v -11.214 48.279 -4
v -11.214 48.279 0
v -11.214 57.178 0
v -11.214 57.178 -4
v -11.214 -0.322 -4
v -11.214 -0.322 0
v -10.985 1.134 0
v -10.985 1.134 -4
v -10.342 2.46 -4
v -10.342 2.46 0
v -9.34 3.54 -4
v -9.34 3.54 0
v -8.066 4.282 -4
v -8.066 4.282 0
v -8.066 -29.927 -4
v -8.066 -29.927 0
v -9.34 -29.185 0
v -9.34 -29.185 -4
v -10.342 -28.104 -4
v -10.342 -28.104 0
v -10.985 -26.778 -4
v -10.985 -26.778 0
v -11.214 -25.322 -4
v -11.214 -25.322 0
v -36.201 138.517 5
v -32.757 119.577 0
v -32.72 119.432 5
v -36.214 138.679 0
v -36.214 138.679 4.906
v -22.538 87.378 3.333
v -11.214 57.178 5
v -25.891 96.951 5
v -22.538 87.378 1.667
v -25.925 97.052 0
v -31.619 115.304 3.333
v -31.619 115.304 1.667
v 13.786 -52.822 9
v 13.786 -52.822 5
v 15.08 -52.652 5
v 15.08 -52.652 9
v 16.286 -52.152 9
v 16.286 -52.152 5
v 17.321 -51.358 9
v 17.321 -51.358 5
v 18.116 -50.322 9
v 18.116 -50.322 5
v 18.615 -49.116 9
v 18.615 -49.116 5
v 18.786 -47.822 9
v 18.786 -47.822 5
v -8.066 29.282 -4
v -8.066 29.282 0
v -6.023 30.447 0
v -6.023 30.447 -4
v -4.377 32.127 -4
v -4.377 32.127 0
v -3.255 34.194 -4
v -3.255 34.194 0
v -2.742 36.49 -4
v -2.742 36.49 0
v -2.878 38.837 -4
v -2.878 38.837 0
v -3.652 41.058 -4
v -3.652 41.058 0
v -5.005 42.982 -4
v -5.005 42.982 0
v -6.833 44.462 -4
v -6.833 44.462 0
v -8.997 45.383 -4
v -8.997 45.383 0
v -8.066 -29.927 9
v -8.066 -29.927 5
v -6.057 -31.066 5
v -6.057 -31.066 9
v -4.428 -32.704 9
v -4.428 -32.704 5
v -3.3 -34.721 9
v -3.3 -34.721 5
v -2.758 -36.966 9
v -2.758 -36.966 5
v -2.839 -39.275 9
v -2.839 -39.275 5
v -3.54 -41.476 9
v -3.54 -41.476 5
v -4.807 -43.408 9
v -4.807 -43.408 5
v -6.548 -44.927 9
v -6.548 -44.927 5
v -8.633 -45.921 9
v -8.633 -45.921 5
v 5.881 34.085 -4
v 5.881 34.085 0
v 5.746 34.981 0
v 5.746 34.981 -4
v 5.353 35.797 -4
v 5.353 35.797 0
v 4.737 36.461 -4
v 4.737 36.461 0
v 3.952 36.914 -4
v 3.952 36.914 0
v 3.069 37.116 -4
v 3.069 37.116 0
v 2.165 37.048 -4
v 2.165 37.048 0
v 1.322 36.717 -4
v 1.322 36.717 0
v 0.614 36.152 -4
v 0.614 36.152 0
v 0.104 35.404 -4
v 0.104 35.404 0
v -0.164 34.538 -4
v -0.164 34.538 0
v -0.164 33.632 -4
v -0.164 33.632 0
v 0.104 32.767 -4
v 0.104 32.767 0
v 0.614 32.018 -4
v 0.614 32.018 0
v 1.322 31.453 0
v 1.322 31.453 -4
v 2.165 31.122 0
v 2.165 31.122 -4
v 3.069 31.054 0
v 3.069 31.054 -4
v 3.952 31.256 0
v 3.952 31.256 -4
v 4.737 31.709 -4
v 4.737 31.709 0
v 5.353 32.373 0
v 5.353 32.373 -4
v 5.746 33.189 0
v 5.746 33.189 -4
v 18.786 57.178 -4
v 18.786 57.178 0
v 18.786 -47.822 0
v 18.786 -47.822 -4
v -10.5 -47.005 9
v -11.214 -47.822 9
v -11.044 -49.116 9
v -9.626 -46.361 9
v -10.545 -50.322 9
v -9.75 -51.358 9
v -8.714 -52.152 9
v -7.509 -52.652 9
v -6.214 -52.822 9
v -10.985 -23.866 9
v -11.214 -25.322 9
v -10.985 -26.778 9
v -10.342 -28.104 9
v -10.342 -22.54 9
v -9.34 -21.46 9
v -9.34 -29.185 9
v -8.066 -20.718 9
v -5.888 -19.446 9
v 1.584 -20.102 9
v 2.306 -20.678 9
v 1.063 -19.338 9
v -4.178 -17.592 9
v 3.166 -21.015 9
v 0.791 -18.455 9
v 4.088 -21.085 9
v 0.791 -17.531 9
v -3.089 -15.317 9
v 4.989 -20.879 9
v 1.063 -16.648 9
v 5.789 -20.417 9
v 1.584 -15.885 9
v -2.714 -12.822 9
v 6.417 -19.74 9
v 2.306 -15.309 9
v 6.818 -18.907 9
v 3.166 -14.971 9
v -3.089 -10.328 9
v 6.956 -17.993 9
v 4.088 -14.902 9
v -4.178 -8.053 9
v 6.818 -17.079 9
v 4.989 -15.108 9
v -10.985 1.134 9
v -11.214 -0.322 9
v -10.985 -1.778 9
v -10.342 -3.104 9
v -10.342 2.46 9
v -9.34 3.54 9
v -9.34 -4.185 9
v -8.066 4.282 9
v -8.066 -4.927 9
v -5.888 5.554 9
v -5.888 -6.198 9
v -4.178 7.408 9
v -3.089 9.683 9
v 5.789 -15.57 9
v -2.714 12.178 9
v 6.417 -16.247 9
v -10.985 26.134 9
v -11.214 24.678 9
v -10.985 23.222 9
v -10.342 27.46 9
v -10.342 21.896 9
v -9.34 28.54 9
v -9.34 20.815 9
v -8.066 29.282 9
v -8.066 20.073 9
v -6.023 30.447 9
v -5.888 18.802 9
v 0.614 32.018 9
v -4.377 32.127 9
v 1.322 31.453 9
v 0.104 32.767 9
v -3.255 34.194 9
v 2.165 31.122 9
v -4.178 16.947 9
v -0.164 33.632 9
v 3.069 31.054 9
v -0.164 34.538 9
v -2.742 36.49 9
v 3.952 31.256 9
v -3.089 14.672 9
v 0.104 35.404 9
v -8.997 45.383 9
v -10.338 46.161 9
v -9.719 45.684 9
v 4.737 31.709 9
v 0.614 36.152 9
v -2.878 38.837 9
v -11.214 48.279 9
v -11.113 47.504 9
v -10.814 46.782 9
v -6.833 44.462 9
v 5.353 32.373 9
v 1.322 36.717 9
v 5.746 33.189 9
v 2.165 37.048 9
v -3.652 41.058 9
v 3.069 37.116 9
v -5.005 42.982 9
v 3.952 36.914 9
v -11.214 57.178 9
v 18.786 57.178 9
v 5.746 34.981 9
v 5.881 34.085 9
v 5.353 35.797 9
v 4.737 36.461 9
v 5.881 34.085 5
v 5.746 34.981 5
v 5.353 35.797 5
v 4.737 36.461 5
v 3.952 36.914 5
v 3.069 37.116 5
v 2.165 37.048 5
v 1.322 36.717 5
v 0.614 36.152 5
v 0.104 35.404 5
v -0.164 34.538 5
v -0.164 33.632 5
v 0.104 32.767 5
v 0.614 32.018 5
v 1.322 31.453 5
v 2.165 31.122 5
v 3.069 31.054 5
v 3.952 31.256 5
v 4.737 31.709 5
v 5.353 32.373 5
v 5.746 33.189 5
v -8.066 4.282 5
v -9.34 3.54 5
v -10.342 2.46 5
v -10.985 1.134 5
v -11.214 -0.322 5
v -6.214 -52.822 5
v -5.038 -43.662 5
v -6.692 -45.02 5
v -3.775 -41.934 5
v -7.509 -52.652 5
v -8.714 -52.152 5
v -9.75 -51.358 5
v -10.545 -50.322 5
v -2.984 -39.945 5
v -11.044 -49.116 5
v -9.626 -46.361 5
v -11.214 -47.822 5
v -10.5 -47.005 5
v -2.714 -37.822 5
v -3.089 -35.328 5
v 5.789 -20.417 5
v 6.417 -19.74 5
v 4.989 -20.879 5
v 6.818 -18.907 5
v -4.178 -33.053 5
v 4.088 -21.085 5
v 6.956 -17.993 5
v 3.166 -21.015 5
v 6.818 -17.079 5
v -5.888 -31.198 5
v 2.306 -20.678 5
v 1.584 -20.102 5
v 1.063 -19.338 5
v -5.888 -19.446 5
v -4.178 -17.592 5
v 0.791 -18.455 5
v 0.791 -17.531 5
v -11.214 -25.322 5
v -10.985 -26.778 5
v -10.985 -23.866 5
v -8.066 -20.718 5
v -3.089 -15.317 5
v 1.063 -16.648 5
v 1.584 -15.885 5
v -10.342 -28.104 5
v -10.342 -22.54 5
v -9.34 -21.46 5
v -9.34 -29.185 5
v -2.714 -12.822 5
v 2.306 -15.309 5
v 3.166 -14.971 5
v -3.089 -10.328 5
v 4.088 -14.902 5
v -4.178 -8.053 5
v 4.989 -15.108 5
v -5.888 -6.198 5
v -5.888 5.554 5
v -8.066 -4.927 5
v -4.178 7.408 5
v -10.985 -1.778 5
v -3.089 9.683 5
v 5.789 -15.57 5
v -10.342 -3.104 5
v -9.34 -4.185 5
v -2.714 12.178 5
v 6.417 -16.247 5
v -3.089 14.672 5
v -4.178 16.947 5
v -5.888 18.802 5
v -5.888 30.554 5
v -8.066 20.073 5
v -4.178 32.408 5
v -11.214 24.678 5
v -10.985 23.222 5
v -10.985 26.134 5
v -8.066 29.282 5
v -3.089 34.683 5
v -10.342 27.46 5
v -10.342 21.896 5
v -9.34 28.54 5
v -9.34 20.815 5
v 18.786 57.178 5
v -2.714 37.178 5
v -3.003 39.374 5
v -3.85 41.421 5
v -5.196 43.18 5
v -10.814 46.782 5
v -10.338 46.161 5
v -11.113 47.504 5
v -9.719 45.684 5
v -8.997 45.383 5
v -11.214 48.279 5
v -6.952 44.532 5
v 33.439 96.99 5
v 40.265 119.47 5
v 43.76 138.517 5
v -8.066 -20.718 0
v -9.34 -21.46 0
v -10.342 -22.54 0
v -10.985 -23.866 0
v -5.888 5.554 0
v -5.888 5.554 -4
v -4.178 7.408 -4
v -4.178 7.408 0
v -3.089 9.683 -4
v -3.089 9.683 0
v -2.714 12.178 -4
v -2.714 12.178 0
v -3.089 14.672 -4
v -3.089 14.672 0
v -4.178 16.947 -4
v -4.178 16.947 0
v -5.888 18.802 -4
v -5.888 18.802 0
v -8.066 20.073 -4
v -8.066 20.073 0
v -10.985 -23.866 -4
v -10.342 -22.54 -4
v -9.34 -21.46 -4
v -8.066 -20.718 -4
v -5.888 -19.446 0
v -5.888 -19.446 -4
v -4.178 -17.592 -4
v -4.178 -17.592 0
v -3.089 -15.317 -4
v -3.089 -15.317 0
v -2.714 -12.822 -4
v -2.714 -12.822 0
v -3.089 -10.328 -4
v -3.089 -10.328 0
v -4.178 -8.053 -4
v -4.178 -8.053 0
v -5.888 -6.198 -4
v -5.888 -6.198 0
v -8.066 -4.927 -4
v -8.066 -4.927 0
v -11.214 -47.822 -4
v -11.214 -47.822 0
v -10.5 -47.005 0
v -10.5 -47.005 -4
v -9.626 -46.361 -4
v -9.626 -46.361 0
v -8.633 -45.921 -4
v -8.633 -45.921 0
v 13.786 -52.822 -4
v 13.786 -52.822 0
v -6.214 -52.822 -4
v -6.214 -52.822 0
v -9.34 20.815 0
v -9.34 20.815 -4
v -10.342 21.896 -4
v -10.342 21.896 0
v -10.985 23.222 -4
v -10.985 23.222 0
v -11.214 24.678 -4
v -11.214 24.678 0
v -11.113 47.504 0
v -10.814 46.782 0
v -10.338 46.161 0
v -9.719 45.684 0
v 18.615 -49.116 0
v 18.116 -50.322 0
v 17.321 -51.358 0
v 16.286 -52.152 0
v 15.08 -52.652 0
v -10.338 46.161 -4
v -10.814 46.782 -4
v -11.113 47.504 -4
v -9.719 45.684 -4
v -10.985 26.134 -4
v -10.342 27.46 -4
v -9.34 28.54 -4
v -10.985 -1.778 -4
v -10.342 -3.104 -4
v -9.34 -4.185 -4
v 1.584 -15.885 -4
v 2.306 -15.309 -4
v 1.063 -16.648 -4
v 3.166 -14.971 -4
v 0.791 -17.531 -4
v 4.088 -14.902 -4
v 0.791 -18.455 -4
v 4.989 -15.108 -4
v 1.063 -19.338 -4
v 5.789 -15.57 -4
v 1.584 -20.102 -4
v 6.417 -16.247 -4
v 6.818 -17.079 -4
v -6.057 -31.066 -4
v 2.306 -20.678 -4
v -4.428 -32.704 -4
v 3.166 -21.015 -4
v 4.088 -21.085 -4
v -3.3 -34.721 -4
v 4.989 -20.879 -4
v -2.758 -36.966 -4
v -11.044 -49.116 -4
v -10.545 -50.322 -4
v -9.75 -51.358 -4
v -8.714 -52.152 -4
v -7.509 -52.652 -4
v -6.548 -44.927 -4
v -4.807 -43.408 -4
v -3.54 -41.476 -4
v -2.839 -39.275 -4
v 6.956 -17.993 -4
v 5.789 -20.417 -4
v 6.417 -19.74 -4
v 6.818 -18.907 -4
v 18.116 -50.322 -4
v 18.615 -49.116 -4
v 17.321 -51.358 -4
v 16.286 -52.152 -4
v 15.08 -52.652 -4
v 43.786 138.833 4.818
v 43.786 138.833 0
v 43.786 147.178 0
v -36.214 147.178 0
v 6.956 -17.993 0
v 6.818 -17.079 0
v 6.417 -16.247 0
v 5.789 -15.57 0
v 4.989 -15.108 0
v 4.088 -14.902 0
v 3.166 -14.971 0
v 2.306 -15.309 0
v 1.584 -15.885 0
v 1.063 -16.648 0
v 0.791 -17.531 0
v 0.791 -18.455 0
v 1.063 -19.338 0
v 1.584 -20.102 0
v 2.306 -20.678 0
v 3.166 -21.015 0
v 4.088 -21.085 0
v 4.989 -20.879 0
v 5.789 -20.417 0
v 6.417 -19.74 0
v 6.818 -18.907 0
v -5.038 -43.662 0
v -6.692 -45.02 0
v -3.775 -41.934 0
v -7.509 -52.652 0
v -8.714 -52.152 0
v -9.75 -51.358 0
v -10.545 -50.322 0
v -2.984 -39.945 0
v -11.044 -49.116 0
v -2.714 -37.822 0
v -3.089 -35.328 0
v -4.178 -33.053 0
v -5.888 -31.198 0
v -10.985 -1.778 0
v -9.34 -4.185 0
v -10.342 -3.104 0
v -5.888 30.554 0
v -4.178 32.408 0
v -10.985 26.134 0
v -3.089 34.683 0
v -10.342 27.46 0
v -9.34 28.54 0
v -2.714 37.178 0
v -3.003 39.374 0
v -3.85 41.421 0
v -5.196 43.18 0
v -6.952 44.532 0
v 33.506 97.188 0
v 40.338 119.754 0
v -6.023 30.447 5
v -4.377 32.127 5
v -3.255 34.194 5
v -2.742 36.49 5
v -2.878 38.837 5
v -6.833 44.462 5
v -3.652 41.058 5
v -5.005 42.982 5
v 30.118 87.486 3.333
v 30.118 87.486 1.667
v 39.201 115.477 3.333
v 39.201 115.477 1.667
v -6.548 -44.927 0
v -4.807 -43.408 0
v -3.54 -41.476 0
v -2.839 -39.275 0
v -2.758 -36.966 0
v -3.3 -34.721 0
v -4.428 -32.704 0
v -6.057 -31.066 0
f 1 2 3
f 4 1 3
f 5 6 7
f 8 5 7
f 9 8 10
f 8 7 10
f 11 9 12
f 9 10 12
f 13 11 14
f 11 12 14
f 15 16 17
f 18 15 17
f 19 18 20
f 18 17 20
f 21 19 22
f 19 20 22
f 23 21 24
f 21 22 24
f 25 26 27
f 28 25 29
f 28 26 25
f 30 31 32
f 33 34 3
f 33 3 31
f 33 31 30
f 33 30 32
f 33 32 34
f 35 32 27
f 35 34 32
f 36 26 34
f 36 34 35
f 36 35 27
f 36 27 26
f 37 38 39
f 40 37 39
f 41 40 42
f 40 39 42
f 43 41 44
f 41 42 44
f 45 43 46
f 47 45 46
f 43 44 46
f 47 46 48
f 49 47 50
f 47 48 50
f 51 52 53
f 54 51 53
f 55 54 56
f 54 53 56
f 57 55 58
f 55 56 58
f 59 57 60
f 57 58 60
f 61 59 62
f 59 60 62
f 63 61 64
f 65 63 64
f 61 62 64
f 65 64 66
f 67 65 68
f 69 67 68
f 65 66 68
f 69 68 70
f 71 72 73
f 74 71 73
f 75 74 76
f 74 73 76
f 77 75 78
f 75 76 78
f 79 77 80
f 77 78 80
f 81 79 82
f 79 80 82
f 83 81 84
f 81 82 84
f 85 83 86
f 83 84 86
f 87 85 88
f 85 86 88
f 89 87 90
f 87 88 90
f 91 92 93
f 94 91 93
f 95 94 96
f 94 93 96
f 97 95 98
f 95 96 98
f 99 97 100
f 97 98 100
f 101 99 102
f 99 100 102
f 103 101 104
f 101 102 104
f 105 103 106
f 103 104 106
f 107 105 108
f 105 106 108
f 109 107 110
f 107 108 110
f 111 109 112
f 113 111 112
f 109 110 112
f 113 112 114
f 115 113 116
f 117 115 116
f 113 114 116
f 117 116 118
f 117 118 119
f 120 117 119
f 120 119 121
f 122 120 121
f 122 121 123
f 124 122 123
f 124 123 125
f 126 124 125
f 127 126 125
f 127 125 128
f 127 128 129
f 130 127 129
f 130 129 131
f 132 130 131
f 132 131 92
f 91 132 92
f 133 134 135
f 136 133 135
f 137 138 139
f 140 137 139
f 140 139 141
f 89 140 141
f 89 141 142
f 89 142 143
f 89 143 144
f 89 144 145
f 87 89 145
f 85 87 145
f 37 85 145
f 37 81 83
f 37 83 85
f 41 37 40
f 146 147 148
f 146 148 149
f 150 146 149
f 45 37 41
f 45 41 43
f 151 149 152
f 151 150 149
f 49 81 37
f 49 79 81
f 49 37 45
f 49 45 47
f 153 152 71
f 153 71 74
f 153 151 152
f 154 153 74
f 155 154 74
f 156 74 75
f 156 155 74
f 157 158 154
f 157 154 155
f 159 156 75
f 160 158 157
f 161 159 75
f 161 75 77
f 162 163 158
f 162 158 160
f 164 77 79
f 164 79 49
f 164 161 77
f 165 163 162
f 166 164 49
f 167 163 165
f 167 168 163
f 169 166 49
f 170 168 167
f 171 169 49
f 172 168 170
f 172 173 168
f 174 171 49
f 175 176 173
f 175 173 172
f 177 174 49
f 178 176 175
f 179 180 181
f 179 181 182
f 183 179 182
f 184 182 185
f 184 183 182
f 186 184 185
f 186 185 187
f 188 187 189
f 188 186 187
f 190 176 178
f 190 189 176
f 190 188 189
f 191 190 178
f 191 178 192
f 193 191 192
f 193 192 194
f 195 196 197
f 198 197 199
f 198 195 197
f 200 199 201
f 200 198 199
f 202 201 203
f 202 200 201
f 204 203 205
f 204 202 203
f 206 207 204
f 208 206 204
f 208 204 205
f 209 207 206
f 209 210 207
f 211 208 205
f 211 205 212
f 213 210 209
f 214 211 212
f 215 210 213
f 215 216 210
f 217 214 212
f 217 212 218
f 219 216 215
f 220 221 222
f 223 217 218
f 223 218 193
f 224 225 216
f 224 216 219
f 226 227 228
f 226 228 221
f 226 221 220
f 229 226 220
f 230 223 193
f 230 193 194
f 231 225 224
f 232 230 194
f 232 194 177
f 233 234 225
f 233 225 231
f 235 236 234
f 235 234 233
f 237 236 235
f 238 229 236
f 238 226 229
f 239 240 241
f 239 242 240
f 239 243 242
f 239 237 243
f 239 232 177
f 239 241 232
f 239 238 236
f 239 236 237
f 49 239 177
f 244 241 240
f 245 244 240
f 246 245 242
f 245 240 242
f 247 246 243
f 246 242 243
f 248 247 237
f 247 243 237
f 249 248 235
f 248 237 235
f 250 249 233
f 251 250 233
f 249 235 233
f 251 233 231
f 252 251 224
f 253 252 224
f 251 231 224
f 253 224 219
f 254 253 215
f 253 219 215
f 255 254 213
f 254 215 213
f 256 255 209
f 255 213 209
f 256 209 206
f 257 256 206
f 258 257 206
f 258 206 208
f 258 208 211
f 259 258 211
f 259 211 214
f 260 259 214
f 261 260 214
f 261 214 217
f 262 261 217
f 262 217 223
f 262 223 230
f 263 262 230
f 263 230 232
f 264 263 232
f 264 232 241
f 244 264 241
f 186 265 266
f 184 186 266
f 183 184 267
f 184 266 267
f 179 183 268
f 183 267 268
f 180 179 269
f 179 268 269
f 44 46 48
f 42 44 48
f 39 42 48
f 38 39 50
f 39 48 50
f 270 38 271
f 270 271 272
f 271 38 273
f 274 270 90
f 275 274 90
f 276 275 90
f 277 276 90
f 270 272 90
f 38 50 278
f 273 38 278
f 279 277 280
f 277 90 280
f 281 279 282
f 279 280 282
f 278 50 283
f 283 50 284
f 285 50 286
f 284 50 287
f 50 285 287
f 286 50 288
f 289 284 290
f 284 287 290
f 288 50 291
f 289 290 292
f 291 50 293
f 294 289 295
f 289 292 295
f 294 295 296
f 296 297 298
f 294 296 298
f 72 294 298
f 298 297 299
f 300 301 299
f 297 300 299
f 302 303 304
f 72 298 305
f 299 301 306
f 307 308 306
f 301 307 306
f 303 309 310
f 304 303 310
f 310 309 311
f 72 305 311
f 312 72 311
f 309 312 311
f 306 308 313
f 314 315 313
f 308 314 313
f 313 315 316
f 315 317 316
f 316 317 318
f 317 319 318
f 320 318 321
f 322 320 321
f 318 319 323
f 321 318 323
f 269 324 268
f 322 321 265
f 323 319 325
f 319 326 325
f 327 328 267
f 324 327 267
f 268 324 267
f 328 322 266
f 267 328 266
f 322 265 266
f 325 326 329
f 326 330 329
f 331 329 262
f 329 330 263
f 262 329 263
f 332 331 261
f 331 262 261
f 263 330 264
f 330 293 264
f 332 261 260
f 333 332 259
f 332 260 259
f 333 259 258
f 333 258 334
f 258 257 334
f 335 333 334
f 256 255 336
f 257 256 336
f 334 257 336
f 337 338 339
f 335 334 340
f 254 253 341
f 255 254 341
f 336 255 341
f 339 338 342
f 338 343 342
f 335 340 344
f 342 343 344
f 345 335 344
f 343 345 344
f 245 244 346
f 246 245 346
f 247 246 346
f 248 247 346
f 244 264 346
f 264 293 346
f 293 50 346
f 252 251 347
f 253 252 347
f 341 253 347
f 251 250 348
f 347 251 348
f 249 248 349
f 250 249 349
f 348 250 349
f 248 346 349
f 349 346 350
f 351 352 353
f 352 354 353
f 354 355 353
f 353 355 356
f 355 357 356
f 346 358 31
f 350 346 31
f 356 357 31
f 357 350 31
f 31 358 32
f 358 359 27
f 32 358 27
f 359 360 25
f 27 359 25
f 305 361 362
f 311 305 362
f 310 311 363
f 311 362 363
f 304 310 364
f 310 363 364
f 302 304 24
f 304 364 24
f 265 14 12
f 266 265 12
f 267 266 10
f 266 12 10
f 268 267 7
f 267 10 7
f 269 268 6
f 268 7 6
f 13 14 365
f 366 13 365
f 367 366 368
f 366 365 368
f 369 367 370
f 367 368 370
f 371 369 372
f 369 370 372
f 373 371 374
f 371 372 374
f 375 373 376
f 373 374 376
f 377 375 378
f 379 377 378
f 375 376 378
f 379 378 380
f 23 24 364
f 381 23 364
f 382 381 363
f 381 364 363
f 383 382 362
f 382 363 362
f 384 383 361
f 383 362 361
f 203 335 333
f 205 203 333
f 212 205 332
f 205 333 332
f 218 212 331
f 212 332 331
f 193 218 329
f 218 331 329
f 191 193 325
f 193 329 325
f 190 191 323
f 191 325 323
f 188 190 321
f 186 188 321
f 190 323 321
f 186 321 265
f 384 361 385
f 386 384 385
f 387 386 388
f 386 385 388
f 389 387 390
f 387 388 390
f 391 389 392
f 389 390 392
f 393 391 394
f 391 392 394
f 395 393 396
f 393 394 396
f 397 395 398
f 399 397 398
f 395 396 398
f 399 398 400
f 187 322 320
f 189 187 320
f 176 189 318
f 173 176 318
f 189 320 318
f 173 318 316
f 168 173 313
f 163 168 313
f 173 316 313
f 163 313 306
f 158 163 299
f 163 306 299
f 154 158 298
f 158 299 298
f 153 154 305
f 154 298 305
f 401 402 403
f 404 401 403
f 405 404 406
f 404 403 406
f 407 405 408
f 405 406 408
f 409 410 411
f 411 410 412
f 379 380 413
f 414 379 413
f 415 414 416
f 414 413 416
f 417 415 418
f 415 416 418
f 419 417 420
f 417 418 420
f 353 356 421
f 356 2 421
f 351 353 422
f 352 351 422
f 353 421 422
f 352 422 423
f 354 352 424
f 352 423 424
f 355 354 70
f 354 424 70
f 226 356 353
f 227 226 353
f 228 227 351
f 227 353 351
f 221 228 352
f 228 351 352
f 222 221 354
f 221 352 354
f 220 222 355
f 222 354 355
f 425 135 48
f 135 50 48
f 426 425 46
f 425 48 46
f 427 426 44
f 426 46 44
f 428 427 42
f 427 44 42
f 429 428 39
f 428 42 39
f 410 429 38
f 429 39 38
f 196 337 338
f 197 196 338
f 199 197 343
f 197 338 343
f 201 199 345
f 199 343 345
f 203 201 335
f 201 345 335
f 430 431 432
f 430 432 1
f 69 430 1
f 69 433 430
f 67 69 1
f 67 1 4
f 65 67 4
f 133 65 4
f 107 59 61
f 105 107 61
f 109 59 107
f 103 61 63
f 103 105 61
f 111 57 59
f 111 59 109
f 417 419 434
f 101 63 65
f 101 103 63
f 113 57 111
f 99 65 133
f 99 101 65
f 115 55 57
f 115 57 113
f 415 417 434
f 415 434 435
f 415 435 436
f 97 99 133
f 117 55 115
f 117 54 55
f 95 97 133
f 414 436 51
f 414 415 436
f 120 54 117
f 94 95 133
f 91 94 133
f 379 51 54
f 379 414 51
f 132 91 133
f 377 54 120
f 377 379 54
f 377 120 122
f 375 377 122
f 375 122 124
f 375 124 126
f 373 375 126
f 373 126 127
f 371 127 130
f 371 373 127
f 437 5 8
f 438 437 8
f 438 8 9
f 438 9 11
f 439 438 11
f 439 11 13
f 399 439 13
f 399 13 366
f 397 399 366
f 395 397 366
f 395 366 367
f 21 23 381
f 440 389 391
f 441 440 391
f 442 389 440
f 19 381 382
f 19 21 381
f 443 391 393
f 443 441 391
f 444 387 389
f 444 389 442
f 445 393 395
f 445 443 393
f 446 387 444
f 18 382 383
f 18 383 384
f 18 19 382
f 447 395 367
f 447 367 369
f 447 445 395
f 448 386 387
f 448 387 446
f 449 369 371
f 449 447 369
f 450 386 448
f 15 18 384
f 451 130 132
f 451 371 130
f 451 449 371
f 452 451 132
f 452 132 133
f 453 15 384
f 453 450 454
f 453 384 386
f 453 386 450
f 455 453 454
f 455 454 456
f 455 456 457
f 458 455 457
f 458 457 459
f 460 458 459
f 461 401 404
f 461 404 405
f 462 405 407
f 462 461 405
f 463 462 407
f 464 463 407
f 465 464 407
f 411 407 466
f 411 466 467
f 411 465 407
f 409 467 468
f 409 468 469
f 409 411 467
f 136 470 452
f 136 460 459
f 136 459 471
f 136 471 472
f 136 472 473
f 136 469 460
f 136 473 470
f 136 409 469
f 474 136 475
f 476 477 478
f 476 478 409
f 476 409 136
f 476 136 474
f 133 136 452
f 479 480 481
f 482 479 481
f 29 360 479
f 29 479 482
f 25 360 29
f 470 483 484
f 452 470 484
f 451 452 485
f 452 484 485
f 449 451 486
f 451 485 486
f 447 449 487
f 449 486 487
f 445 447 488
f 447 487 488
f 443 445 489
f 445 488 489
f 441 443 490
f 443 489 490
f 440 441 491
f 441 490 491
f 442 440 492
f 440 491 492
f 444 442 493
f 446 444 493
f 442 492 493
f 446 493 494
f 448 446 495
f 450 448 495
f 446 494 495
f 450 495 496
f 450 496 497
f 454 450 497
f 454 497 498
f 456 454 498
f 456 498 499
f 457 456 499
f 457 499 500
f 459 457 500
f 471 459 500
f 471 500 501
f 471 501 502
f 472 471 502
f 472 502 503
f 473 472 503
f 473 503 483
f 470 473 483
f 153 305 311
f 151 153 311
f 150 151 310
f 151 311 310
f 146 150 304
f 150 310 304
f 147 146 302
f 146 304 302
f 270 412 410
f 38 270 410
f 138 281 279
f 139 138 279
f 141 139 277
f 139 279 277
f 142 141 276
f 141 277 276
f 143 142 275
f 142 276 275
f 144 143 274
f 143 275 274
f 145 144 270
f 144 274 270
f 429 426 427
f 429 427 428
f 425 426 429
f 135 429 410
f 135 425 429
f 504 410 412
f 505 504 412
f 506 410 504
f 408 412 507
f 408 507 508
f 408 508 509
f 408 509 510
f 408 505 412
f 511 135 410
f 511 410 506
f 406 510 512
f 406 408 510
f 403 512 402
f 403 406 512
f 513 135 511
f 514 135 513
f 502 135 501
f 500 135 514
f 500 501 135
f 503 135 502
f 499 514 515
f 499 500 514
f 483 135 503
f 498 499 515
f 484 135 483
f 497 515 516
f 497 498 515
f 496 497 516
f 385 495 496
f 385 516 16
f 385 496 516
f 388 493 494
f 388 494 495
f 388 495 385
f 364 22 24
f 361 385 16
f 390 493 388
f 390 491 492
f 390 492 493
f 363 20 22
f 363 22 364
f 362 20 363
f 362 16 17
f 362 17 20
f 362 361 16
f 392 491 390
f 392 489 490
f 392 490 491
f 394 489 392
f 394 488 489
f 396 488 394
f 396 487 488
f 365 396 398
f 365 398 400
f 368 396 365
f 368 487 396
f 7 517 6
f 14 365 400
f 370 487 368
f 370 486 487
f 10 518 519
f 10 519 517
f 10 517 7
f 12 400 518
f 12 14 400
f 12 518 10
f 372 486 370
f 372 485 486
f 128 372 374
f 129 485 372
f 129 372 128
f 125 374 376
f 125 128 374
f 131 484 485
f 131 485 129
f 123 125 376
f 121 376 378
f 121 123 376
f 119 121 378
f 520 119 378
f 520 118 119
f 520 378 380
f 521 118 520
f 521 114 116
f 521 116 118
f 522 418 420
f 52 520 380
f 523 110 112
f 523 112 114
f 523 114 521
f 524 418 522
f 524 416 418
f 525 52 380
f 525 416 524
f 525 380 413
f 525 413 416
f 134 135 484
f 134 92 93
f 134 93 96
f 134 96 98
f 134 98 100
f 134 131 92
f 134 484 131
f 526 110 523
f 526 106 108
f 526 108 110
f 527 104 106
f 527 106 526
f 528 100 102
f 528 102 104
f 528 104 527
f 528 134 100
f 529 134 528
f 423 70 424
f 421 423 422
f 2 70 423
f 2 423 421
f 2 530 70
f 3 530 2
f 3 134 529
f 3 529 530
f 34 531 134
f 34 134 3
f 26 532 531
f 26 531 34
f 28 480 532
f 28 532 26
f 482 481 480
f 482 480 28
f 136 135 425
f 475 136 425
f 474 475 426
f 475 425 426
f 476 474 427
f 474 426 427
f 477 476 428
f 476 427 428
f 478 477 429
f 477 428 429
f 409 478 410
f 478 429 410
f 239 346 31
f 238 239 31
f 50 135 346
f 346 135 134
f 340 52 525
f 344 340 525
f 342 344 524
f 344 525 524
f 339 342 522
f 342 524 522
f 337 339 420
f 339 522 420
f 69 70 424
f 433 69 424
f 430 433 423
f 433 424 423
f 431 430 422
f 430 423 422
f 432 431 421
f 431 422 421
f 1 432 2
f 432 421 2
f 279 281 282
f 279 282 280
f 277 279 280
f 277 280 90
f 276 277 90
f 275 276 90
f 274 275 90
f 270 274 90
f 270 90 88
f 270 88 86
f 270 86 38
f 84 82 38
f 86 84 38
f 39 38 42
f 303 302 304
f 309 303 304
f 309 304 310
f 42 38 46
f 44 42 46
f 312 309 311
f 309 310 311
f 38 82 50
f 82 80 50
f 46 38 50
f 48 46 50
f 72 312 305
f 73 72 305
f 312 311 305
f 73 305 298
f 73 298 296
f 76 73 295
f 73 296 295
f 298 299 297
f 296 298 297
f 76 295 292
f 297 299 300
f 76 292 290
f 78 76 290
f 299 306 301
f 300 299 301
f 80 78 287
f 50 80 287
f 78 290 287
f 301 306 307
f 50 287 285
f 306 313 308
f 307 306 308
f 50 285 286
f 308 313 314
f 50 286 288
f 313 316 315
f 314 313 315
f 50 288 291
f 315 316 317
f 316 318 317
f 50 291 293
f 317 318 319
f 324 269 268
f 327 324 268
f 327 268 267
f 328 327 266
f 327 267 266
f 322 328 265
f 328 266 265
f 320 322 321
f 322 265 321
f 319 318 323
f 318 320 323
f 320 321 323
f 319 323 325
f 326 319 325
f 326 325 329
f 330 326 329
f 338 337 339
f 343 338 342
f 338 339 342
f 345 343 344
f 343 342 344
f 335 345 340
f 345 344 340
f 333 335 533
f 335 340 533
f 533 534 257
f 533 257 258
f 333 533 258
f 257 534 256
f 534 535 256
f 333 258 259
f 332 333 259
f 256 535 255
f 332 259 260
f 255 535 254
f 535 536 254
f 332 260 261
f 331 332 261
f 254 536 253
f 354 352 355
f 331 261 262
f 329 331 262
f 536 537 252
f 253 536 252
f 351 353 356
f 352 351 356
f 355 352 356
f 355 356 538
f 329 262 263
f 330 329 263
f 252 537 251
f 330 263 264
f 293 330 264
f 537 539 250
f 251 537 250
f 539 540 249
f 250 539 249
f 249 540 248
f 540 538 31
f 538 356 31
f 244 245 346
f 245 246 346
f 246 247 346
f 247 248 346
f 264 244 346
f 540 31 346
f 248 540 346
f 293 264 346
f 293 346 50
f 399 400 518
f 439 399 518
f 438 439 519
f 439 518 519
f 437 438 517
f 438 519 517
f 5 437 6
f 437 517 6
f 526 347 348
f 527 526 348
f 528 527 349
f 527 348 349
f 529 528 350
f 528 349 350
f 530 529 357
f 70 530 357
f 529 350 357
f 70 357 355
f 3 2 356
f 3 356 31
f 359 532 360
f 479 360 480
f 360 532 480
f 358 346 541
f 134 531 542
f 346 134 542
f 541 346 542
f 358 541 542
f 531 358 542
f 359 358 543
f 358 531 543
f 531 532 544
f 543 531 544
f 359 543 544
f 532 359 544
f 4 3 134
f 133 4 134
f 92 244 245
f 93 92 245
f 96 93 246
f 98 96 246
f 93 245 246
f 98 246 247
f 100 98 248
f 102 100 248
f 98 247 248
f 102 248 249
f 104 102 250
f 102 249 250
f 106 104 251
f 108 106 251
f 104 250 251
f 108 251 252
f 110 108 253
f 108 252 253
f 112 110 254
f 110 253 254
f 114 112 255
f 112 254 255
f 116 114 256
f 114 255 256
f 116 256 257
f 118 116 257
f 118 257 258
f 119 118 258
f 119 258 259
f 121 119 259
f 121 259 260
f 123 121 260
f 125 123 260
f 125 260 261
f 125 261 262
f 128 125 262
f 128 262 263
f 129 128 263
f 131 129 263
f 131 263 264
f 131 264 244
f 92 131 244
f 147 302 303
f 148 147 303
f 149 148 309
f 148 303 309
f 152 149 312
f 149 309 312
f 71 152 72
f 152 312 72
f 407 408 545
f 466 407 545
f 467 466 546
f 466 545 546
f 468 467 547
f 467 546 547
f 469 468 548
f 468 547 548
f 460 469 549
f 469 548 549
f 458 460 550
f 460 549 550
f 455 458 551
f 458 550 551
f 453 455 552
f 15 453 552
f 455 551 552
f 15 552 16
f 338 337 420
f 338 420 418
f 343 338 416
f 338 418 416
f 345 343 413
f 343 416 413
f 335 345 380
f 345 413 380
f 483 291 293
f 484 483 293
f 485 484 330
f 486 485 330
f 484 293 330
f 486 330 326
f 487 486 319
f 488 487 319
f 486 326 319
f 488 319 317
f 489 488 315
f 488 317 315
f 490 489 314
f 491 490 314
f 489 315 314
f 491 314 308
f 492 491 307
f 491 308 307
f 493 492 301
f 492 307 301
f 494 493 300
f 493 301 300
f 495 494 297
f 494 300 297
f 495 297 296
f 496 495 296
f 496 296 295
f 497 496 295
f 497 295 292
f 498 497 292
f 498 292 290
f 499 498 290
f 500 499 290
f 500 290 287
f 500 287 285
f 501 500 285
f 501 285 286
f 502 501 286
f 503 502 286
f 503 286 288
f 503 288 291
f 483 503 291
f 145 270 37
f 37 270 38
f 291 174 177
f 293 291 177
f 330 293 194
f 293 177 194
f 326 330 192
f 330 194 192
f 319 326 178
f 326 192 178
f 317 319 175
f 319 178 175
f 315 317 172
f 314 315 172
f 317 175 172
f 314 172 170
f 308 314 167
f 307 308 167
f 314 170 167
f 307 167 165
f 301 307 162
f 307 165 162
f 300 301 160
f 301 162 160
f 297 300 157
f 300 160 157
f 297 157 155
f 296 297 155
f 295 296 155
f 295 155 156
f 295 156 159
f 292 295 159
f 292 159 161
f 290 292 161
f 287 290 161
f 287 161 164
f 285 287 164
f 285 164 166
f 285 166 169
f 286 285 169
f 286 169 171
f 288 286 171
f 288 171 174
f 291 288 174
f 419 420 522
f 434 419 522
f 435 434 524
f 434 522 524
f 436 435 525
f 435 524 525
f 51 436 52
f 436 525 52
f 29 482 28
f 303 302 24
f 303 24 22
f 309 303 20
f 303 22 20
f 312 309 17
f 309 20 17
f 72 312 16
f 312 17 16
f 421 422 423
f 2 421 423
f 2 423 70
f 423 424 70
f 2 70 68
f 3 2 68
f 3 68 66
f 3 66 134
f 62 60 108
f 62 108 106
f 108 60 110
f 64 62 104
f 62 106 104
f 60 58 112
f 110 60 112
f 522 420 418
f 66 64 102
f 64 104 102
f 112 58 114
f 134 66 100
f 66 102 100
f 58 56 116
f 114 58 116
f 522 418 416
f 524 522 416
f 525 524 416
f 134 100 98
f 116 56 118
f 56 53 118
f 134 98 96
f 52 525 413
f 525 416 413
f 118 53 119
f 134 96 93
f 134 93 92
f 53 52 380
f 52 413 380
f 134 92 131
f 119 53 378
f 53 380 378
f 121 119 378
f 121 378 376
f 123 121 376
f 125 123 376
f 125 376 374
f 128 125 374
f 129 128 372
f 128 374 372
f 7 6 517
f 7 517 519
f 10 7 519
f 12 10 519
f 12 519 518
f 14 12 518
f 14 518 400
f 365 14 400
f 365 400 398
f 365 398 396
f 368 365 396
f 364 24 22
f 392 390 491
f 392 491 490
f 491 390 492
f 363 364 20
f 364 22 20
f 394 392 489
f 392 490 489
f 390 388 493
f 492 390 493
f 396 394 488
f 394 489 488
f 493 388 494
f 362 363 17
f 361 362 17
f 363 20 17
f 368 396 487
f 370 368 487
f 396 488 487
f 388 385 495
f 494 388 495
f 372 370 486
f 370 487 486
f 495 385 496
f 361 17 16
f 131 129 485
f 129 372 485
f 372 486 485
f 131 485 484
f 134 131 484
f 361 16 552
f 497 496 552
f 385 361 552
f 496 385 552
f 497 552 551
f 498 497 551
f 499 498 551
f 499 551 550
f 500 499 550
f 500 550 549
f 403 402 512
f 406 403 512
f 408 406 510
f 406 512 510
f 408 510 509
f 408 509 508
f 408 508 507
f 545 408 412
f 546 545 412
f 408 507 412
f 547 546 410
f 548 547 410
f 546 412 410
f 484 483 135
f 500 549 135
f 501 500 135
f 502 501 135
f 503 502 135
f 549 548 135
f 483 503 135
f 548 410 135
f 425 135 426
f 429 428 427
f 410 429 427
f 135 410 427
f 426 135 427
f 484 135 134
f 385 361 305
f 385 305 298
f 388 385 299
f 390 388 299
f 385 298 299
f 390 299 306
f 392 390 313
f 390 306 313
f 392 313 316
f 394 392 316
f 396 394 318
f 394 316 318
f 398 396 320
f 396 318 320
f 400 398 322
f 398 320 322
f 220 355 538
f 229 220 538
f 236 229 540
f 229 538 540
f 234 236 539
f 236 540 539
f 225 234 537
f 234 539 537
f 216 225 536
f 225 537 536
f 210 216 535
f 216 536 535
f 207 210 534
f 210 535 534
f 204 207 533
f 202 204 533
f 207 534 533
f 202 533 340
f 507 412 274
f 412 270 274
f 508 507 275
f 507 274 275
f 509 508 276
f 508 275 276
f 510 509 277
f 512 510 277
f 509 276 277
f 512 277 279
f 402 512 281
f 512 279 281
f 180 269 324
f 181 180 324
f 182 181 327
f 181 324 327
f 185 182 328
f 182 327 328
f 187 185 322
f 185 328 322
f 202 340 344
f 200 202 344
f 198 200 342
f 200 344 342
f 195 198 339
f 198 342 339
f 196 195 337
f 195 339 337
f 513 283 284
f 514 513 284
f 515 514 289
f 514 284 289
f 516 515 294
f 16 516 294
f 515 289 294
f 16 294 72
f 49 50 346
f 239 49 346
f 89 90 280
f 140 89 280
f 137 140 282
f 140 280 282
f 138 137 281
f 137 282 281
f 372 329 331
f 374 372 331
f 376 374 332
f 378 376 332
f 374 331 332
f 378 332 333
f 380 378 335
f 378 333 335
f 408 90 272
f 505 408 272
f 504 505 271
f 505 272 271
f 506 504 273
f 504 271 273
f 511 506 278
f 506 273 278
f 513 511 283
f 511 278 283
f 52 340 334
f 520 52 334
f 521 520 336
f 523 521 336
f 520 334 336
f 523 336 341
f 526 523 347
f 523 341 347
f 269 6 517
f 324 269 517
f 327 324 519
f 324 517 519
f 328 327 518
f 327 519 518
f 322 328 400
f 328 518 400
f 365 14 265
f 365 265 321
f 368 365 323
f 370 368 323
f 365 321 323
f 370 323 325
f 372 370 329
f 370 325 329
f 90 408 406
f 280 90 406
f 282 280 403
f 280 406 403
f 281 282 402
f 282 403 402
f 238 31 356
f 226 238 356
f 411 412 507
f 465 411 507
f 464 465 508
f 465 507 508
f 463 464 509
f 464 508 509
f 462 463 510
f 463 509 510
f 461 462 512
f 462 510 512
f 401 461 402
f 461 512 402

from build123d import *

# Parameters (mm, degrees)
F0_W        = 30
F0_H        = 90
F0_H_2      = 110
F1_DEPTH    = 5
F3_R        = 5
F4_DEPTH    = 25
F5_T1_DEPTH = 25.1996810199
F5_T3_DEPTH = 18.0610213145
F6_R        = 3
F7_SIZE2    = 8.660244
F7_SIZE     = 4.99999
F9_DEPTH    = 4
F11_DEPTH   = 4
F12_R       = 3.0392347024
F12_R_2     = 3.1
F13_DEPTH   = 25


# Not quite as in the source:
# - a fillet or chamfer that OpenCascade refuses, or shapes differently, is made with other operations: its cross-section is extruded or revolved along the edge and cut away or added
# - a fillet or chamfer is up to 0.001 mm smaller than in the source, because OpenCascade refuses the exact size


with BuildPart() as f1:
    # F0 (on Top) → F1 (new body)
    with BuildSketch(Plane.XY):
        with BuildLine():
            add(Edge.make_bspline(
                [(-11.2144336104, 57.1776708961), (-22.912006026, 87.7576573075), (-34.6095784415, 118.3376437189), (-36.2144336104, 138.6793877413)],
                knots=[0, 0, 0, 0, 0.5742115835, 0.5742115835, 0.5742115835, 0.5742115835], degree=3))
            Line((-11.2144336104, 57.1776708961), (-11.2144336104, 147.1776708961))
            Line((-11.2144336104, 147.1776708961), (-36.2144336104, 147.1776708961))
            Line((-36.2144336104, 147.1776708961), (-36.2144336104, 138.6793877413))
        make_face()
        with Locations((3.7855663896, 102.1776708961)):
            Rectangle(F0_W, F0_H)
        with BuildLine():
            Line((18.7855663896, 147.1776708961), (18.7855663896, 57.1776708961))
            add(Edge.make_bspline(
                [(18.7855663896, 57.1776708961), (30.4925554698, 87.8723420853), (42.1995445501, 118.5670132745), (43.7855663896, 138.8334699858)],
                knots=[0, 0, 0, 0, 0.5773994274, 0.5773994274, 0.5773994274, 0.5773994274], degree=3))
            Line((43.7855663896, 138.8334699858), (43.7855663896, 147.1776708961))
            Line((43.7855663896, 147.1776708961), (18.7855663896, 147.1776708961))
        make_face()
        with Locations((3.7855663896, 2.1776708961)):
            Rectangle(F0_W, F0_H_2)
    extrude(amount=F1_DEPTH)

    # F3
    f3_edges = [f1.edges().sort_by_distance(p)[0] for p in [
        (-11.214434, -52.822329, 2.5),
        (18.785566, -52.822329, 2.5),
    ]]
    fillet(f3_edges, radius=F3_R)

    # F2 (on face) → F4 (cut)
    with BuildSketch(Plane.XY.offset(5)):
        with BuildLine():
            ThreePointArc((-11.2144336104, 28.6776708961), (-5.2040259704, 31.167263256), (-2.7144336104, 37.1776708961))
            ThreePointArc((-2.7144336104, 37.1776708961), (-5.2040259704, 43.1880785361), (-11.2144336104, 45.6776708961))
            Line((-11.2144336104, 45.6776708961), (-11.2144336104, 28.6776708961))
        make_face()
        with BuildLine():
            ThreePointArc((-2.7144336104, 12.1776708961), (-5.2040259704, 18.1880785361), (-11.2144336104, 20.6776708961))
            Line((-11.2144336104, 20.6776708961), (-11.2144336104, 3.6776708961))
            ThreePointArc((-11.2144336104, 3.6776708961), (-5.2040259704, 6.167263256), (-2.7144336104, 12.1776708961))
        make_face()
        with BuildLine():
            ThreePointArc((-2.7144336104, -12.8223291039), (-5.2040259704, -6.8119214639), (-11.2144336104, -4.3223291039))
            Line((-11.2144336104, -4.3223291039), (-11.2144336104, -21.3223291039))
            ThreePointArc((-11.2144336104, -21.3223291039), (-5.2040259704, -18.832736744), (-2.7144336104, -12.8223291039))
        make_face()
        with BuildLine():
            ThreePointArc((-2.7144336104, -37.8223291039), (-5.2040259704, -31.8119214639), (-11.2144336104, -29.3223291039))
            Line((-11.2144336104, -29.3223291039), (-11.2144336104, -46.3223291039))
            ThreePointArc((-11.2144336104, -46.3223291039), (-5.2040259704, -43.832736744), (-2.7144336104, -37.8223291039))
        make_face()
    extrude(amount=-F4_DEPTH, mode=Mode.SUBTRACT)

    # F5: fillet of radius 5 on 7 edges, made by hand

    # F5_s2 → F5_t1 (cut)
    with BuildSketch(Plane.XY.offset(-10.09984051)):
        with BuildLine():
            ThreePointArc((-11.2144336104, -0.2823929), (-10.3532292843, -3.0878109384), (-8.0662854623, -4.9268137163))
            ThreePointArc((-8.0662854623, -4.9268137163), (-9.6116049851, -4.4748180738), (-11.2144336104, -4.3223291039))
            Line((-11.2144336104, -4.3223291039), (-11.2144336104, -0.2823929))
        make_face()
        with BuildLine():
            ThreePointArc((-8.0662854623, 4.2821555084), (-10.3532292843, 2.4431527305), (-11.2144336104, -0.3622653079))
            Line((-11.2144336104, -0.3622653079), (-11.2144336104, 3.6776708961))
            ThreePointArc((-11.2144336104, 3.6776708961), (-9.6116049851, 3.8301598659), (-8.0662854623, 4.2821555084))
        make_face()
        with BuildLine():
            ThreePointArc((-8.0662854623, -20.7178444916), (-10.3532292843, -22.5568472695), (-11.2144336104, -25.3622653079))
            Line((-11.2144336104, -25.3622653079), (-11.2144336104, -21.3223291039))
            ThreePointArc((-11.2144336104, -21.3223291039), (-9.6116049851, -21.1698401341), (-8.0662854623, -20.7178444916))
        make_face()
        with BuildLine():
            ThreePointArc((-11.2144336104, -25.2823929), (-10.3532292843, -28.0878109384), (-8.0662854623, -29.9268137163))
            ThreePointArc((-8.0662854623, -29.9268137163), (-9.6116049851, -29.4748180738), (-11.2144336104, -29.3223291039))
            Line((-11.2144336104, -29.3223291039), (-11.2144336104, -25.2823929))
        make_face()
        with BuildLine():
            ThreePointArc((-11.2144336104, 24.7176071), (-10.3532292843, 21.9121890616), (-8.0662854623, 20.0731862837))
            ThreePointArc((-8.0662854623, 20.0731862837), (-9.6116049851, 20.5251819262), (-11.2144336104, 20.6776708961))
            Line((-11.2144336104, 20.6776708961), (-11.2144336104, 24.7176071))
        make_face()
        with BuildLine():
            ThreePointArc((-8.0662854623, 29.2821555084), (-10.3532292843, 27.4431527305), (-11.2144336104, 24.6377346921))
            Line((-11.2144336104, 24.6377346921), (-11.2144336104, 28.6776708961))
            ThreePointArc((-11.2144336104, 28.6776708961), (-9.6116049851, 28.8301598659), (-8.0662854623, 29.2821555084))
        make_face()
    extrude(amount=F5_T1_DEPTH, mode=Mode.SUBTRACT)

    # F5_s4 → F5_t3 (cut)
    with BuildSketch(Plane.XY.offset(-6.5305106572)):
        with BuildLine():
            ThreePointArc((-8.6332520843, -45.9209402151), (-10.0803650529, -46.6591519697), (-11.2144336104, -47.8223291039))
            Line((-11.2144336104, -47.8223291039), (-11.2144336104, -46.3223291039))
            ThreePointArc((-11.2144336104, -46.3223291039), (-9.908331479, -46.2213824567), (-8.6332520843, -45.9209402151))
        make_face()
    extrude(amount=F5_T3_DEPTH, mode=Mode.SUBTRACT)

    # F6
    f6_edges = [f1.edges().sort_by_distance(p)[0] for p in [
        (-11.214434, 45.677671, 2.5),
    ]]
    fillet(f6_edges, radius=F6_R)

    # F7 (size 5 and 8.6602540378 in the source; OpenCascade refuses exactly that, so slightly less here)
    f7_edges = [f1.edges().sort_by_distance(p)[0] for p in [
        (3.785566, 147.177671, 5),
    ]]
    f7_side = f1.faces().sort_by_distance((3.785566, 147.177671, 2.5))[0]
    chamfer(f7_edges, length=F7_SIZE, length2=F7_SIZE2, reference=f7_side)


with BuildPart() as f9:
    # F8 (on face) → F9 (new body)
    with BuildSketch(Plane.XY.offset(5)):
        with BuildLine():
            Line((18.7855663896, 57.1776708961), (-11.2144336104, 57.1776708961))
            Line((-11.2144336104, 57.1776708961), (-11.2144336104, 48.2794725516))
            ThreePointArc((-11.2144336104, 48.2794725516), (-10.5964313106, 46.455716275), (-8.9970423061, 45.3833503806))
            ThreePointArc((-8.9970423061, 45.3833503806), (-2.7285999753, 37.6682088837), (-8.0662854623, 29.2821555084))
            ThreePointArc((-8.0662854623, 29.2821555084), (-10.3419924147, 27.4596592689), (-11.2142741178, 24.677670896))
            ThreePointArc((-11.2142741178, 24.677670896), (-10.3419924147, 21.8956825232), (-8.0662854623, 20.0731862837))
            ThreePointArc((-8.0662854623, 20.0731862837), (-2.7144336104, 12.1776708961), (-8.0662854623, 4.2821555084))
            ThreePointArc((-8.0662854623, 4.2821555084), (-10.3419924147, 2.4596592689), (-11.2142741178, -0.322329104))
            ThreePointArc((-11.2142741178, -0.322329104), (-10.3419924147, -3.1043174768), (-8.0662854623, -4.9268137163))
            ThreePointArc((-8.0662854623, -4.9268137163), (-2.7144336104, -12.8223291039), (-8.0662854623, -20.7178444916))
            ThreePointArc((-8.0662854623, -20.7178444916), (-10.3419924147, -22.5403407311), (-11.2142741178, -25.322329104))
            ThreePointArc((-11.2142741178, -25.322329104), (-10.3419924147, -28.1043174768), (-8.0662854623, -29.9268137163))
            ThreePointArc((-8.0662854623, -29.9268137163), (-2.7197690942, -38.123451597), (-8.6332520843, -45.9209402151))
            ThreePointArc((-8.6332520843, -45.9209402151), (-10.0803650529, -46.6591519697), (-11.2144336104, -47.8223291039))
            ThreePointArc((-11.2144336104, -47.8223291039), (-9.7499675164, -51.3578630099), (-6.2144336104, -52.8223291039))
            Line((-6.2144336104, -52.8223291039), (13.7855663896, -52.8223291039))
            ThreePointArc((13.7855663896, -52.8223291039), (17.3211002955, -51.3578630099), (18.7855663896, -47.8223291039))
            Line((18.7855663896, -47.8223291039), (18.7855663896, 57.1776708961))
        make_face()
    extrude(amount=F9_DEPTH)


with BuildPart() as f11:
    # F10 (on face) → F11 (new body)
    with BuildSketch(Plane(origin=(0, 0, 0), x_dir=(1, 0, 0), z_dir=(0, 0, -1))):
        with BuildLine():
            Line((-11.2144336104, -57.1776708961), (18.7855663896, -57.1776708961))
            Line((18.7855663896, -57.1776708961), (18.7855663896, 47.8223291039))
            ThreePointArc((18.7855663896, 47.8223291039), (17.3211002955, 51.3578630099), (13.7855663896, 52.8223291039))
            Line((13.7855663896, 52.8223291039), (-6.2144336104, 52.8223291039))
            ThreePointArc((-6.2144336104, 52.8223291039), (-9.7499675164, 51.3578630099), (-11.2144336104, 47.8223291039))
            ThreePointArc((-11.2144336104, 47.8223291039), (-10.0803650529, 46.6591519697), (-8.6332520843, 45.9209402151))
            ThreePointArc((-8.6332520843, 45.9209402151), (-2.7197690942, 38.123451597), (-8.0662854623, 29.9268137163))
            ThreePointArc((-8.0662854623, 29.9268137163), (-10.3419924147, 28.1043174768), (-11.2142741178, 25.322329104))
            ThreePointArc((-11.2142741178, 25.322329104), (-10.3419924147, 22.5403407311), (-8.0662854623, 20.7178444916))
            ThreePointArc((-8.0662854623, 20.7178444916), (-2.7144336104, 12.8223291039), (-8.0662854623, 4.9268137163))
            ThreePointArc((-8.0662854623, 4.9268137163), (-10.3419924147, 3.1043174768), (-11.2142741178, 0.322329104))
            ThreePointArc((-11.2142741178, 0.322329104), (-10.3419924147, -2.4596592689), (-8.0662854623, -4.2821555084))
            ThreePointArc((-8.0662854623, -4.2821555084), (-2.7144336104, -12.1776708961), (-8.0662854623, -20.0731862837))
            ThreePointArc((-8.0662854623, -20.0731862837), (-10.3419924147, -21.8956825232), (-11.2142741178, -24.677670896))
            ThreePointArc((-11.2142741178, -24.677670896), (-10.3419924147, -27.4596592689), (-8.0662854623, -29.2821555084))
            ThreePointArc((-8.0662854623, -29.2821555084), (-2.7285999753, -37.6682088837), (-8.9970423061, -45.3833503806))
            ThreePointArc((-8.9970423061, -45.3833503806), (-10.5964313106, -46.455716275), (-11.2144336104, -48.2794725516))
            Line((-11.2144336104, -48.2794725516), (-11.2144336104, -57.1776708961))
        make_face()
    extrude(amount=F11_DEPTH)


with BuildPart() as f13_tool:
    # F12 (on face) → F13 (new body)
    with BuildSketch(Plane.XY.offset(9)):
        with Locations((2.841765537, 34.0852281909)):
            Circle(F12_R)
        with Locations((3.8561289876, -17.9932220587)):
            Circle(F12_R_2)
    extrude(amount=-F13_DEPTH)


with BuildPart() as f1_1:
    add(f1.part)

    # F13: cut by f13_tool
    add(f13_tool.part, mode=Mode.SUBTRACT)


with BuildPart() as f9_1:
    add(f9.part)

    # F13: cut by f13_tool
    add(f13_tool.part, mode=Mode.SUBTRACT)


with BuildPart() as f11_1:
    add(f11.part)

    # F13: cut by f13_tool
    add(f13_tool.part, mode=Mode.SUBTRACT)


solid = Compound([f1_1.part, f9_1.part, f11_1.part])
